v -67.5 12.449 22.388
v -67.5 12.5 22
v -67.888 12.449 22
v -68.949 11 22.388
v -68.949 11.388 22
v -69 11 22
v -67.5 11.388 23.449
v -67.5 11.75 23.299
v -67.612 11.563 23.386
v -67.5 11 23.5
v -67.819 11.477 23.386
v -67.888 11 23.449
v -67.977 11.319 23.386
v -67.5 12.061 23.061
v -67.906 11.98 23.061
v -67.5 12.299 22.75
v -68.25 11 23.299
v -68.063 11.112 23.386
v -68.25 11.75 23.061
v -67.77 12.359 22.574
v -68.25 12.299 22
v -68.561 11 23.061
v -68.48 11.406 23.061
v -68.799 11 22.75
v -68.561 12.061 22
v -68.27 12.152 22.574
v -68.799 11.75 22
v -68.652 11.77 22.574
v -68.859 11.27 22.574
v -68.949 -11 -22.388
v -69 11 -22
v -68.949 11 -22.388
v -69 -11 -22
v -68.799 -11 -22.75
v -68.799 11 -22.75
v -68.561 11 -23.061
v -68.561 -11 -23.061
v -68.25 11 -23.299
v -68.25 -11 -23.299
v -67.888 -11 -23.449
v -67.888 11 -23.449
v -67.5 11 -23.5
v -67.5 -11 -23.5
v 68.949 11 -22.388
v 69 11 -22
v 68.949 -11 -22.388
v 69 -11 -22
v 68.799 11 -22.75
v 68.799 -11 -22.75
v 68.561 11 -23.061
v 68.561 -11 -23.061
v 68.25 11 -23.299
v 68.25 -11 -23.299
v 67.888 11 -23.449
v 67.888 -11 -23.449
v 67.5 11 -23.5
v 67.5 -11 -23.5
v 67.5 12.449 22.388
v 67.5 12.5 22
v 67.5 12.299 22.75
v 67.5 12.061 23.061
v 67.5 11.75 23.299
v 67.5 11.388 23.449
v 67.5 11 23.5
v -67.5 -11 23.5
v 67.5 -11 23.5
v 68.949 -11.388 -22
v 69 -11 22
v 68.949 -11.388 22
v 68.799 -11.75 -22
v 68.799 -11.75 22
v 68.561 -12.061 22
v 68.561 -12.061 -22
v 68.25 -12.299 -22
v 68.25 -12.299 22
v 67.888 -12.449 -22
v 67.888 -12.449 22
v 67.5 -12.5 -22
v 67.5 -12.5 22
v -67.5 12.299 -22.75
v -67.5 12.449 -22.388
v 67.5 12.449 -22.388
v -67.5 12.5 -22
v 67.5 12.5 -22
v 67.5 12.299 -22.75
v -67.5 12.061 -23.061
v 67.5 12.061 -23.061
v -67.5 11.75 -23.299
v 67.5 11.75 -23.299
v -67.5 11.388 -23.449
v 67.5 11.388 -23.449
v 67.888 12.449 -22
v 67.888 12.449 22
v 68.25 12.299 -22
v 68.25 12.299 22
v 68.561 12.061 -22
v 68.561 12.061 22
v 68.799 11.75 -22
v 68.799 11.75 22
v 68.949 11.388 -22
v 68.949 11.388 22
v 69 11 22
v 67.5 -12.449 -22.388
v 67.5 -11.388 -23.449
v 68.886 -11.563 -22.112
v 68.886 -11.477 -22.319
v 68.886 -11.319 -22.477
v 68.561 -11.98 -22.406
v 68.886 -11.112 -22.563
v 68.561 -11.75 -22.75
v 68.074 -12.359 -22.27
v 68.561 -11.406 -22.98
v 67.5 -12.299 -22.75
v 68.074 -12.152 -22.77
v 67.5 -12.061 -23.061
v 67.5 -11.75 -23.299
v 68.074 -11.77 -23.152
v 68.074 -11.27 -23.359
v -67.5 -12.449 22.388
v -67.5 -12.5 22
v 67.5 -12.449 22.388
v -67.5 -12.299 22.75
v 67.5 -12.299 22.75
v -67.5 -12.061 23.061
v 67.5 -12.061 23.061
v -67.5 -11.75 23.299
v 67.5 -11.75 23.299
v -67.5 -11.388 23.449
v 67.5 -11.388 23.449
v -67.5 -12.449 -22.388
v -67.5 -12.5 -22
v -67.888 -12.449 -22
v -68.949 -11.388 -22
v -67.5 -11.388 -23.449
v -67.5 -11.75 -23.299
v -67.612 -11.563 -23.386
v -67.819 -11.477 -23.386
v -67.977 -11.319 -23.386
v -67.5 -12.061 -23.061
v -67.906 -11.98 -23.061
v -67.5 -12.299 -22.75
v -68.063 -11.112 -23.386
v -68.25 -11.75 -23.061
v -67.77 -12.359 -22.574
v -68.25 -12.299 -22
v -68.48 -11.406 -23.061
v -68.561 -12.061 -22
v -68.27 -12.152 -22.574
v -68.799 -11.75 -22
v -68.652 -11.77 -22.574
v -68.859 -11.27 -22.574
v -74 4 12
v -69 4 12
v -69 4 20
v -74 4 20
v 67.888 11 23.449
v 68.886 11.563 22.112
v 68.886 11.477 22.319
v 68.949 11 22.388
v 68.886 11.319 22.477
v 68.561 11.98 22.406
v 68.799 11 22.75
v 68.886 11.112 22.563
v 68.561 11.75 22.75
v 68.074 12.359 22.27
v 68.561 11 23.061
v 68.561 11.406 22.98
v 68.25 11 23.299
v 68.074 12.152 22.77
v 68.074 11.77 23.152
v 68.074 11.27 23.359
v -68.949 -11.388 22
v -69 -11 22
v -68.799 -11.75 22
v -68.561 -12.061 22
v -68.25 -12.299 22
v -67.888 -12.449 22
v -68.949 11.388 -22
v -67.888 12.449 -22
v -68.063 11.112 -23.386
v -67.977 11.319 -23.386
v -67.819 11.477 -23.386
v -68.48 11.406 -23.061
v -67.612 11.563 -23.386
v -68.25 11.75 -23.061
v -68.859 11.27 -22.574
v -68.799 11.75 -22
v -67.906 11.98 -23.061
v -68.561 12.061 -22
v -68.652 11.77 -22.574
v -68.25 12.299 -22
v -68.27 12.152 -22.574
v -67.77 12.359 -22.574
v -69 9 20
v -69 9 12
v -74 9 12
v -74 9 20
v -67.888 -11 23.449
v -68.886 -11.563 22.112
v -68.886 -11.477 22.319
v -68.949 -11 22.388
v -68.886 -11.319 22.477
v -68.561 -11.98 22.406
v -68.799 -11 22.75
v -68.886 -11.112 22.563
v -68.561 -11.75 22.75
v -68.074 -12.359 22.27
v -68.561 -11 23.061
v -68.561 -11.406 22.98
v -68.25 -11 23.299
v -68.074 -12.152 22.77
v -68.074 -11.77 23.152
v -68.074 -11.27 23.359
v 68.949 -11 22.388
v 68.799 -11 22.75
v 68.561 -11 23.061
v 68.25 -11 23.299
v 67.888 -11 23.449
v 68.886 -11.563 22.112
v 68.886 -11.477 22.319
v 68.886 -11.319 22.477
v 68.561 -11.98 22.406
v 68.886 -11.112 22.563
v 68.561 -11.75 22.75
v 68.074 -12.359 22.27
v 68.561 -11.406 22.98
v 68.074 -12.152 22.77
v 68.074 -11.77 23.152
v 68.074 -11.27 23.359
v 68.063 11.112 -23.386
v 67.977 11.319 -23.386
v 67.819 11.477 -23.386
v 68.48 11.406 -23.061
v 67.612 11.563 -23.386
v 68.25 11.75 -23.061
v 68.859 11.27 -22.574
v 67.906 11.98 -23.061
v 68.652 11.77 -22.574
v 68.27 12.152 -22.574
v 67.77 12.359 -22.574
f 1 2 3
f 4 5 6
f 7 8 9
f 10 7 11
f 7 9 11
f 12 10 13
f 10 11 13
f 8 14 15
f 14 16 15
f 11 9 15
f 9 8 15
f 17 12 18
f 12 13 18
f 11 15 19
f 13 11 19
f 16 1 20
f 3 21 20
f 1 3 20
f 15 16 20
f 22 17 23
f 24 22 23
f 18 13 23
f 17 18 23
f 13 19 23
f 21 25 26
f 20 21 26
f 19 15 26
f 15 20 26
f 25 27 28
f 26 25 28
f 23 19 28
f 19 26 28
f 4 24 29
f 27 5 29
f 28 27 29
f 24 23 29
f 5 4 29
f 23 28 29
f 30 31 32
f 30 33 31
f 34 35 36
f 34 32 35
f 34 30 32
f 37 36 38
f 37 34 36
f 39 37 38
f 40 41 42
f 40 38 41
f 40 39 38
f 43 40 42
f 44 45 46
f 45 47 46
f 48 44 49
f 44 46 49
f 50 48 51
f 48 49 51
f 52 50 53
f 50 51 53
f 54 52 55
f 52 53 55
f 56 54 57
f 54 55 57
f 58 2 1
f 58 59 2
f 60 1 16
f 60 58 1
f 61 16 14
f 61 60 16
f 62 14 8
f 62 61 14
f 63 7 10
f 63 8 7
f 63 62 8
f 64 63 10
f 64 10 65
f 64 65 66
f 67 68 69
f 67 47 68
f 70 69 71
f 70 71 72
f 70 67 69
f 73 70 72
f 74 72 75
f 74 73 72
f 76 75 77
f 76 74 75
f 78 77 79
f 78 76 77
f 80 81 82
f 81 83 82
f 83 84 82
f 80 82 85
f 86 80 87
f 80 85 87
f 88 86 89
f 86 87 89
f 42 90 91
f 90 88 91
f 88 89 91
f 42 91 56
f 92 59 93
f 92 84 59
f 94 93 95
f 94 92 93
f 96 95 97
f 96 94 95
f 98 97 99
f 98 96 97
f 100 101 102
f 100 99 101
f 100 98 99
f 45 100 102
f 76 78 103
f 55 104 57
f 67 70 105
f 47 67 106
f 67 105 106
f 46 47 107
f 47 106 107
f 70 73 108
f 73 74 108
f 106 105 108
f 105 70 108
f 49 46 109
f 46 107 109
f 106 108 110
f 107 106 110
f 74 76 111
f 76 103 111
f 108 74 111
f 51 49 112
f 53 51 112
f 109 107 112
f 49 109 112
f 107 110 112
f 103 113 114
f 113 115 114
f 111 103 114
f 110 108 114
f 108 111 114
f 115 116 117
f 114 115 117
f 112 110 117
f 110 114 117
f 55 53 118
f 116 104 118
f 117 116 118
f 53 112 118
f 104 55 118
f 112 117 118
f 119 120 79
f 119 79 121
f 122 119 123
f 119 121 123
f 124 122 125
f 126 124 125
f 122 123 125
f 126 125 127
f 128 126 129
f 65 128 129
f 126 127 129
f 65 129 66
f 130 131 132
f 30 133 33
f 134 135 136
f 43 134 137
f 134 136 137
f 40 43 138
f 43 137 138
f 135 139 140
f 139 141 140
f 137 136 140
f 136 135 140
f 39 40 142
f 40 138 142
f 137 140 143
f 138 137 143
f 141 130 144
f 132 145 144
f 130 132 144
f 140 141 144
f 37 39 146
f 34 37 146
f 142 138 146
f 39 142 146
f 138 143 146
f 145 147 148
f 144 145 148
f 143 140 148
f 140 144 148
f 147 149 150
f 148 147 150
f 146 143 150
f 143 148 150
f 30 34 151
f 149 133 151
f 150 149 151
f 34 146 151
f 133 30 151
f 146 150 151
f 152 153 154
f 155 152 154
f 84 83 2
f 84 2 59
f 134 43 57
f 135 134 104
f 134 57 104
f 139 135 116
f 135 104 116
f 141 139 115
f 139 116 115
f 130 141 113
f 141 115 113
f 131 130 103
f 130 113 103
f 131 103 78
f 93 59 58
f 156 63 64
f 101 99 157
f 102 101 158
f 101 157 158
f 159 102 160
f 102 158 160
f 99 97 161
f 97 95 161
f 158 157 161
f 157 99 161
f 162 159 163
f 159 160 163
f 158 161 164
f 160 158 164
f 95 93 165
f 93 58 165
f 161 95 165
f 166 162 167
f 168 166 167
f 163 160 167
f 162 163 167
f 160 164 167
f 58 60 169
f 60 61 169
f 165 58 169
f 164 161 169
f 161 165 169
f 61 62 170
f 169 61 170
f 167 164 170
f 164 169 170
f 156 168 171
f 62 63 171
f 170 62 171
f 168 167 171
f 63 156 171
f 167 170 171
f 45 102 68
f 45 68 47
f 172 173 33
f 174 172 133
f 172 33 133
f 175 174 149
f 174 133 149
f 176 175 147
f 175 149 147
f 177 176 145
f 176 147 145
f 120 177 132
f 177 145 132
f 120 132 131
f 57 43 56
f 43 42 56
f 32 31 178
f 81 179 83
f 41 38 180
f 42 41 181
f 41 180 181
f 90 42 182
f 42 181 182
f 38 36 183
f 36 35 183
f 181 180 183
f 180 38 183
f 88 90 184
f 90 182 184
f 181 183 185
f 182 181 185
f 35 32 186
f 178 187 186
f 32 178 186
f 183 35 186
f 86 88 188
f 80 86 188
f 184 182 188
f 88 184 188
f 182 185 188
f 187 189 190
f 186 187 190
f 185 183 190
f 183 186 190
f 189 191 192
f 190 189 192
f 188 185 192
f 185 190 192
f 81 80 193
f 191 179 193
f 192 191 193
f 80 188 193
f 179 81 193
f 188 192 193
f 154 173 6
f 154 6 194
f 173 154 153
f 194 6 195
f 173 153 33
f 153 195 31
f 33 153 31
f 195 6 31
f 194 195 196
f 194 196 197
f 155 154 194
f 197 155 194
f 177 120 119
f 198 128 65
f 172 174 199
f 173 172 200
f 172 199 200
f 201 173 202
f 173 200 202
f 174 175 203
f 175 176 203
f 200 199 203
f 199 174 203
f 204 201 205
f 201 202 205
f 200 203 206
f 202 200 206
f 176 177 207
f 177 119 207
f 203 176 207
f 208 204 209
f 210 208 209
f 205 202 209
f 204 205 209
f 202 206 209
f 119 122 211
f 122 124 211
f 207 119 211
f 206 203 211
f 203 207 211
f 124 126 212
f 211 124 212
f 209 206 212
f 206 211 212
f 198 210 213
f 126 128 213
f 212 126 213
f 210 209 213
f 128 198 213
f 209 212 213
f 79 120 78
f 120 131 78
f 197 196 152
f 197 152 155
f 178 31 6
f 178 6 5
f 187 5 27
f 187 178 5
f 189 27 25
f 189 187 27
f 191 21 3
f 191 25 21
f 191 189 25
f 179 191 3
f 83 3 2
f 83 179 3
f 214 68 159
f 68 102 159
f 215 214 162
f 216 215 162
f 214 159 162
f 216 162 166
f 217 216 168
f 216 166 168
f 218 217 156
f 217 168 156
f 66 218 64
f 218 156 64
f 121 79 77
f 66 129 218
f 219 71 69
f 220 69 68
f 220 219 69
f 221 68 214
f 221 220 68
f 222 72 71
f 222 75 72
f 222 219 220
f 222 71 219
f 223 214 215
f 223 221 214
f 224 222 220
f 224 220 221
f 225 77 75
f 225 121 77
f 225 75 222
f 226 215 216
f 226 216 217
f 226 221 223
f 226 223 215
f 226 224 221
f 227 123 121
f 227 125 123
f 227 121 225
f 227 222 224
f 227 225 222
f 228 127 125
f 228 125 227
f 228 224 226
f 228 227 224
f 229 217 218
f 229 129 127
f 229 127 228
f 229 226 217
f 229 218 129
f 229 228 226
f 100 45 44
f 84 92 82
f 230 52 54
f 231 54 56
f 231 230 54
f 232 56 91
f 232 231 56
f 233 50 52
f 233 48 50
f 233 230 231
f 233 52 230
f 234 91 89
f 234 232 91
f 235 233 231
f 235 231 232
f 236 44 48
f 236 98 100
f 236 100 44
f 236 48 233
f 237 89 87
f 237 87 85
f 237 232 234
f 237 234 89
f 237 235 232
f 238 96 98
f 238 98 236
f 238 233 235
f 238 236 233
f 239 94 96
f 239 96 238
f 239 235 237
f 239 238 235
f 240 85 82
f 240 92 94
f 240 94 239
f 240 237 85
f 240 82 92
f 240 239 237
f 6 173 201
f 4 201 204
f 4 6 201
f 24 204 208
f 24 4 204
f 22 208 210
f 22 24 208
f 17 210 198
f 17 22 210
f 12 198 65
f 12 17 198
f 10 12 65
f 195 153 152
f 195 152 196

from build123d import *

# Parameters (mm, degrees)
SKETCH1_W           = 138
SKETCH1_H           = 47
BOSS_EXTRUDE1_DEPTH = 12.5
FILLET1_R           = 1.5
SKETCH2_W           = 8
SKETCH2_H           = 5
BOSS_EXTRUDE2_DEPTH = 5


with BuildPart() as part:
    # Sketch1 → Boss-Extrude1 (new, symmetric)
    with BuildSketch(Plane(origin=(0, 0, 0), x_dir=(1, 0, 0), z_dir=(0, 1, 0))):
        Rectangle(SKETCH1_W, SKETCH1_H)
    extrude(amount=BOSS_EXTRUDE1_DEPTH, both=True)

    # Fillet1
    fillet1_edges = [part.edges().sort_by_distance(p)[0] for p in [
        (-69, 12.5, 0),
        (0, 12.5, 23.5),
        (69, 12.5, 0),
        (0, -12.5, 23.5),
        (-69, -12.5, 0),
        (0, -12.5, -23.5),
        (69, -12.5, 0),
        (69, 0, 23.5),
        (-69, 0, 23.5),
        (-69, 0, -23.5),
        (69, 0, -23.5),
        (0, 12.5, -23.5),
    ]]
    fillet(fillet1_edges, radius=FILLET1_R)

    # Sketch2 → Boss-Extrude2 (add)
    with BuildSketch(Plane.ZY.offset(69)):
        with Locations((16, 6.5)):
            Rectangle(SKETCH2_W, SKETCH2_H)
    extrude(amount=BOSS_EXTRUDE2_DEPTH)


solid = part.part
